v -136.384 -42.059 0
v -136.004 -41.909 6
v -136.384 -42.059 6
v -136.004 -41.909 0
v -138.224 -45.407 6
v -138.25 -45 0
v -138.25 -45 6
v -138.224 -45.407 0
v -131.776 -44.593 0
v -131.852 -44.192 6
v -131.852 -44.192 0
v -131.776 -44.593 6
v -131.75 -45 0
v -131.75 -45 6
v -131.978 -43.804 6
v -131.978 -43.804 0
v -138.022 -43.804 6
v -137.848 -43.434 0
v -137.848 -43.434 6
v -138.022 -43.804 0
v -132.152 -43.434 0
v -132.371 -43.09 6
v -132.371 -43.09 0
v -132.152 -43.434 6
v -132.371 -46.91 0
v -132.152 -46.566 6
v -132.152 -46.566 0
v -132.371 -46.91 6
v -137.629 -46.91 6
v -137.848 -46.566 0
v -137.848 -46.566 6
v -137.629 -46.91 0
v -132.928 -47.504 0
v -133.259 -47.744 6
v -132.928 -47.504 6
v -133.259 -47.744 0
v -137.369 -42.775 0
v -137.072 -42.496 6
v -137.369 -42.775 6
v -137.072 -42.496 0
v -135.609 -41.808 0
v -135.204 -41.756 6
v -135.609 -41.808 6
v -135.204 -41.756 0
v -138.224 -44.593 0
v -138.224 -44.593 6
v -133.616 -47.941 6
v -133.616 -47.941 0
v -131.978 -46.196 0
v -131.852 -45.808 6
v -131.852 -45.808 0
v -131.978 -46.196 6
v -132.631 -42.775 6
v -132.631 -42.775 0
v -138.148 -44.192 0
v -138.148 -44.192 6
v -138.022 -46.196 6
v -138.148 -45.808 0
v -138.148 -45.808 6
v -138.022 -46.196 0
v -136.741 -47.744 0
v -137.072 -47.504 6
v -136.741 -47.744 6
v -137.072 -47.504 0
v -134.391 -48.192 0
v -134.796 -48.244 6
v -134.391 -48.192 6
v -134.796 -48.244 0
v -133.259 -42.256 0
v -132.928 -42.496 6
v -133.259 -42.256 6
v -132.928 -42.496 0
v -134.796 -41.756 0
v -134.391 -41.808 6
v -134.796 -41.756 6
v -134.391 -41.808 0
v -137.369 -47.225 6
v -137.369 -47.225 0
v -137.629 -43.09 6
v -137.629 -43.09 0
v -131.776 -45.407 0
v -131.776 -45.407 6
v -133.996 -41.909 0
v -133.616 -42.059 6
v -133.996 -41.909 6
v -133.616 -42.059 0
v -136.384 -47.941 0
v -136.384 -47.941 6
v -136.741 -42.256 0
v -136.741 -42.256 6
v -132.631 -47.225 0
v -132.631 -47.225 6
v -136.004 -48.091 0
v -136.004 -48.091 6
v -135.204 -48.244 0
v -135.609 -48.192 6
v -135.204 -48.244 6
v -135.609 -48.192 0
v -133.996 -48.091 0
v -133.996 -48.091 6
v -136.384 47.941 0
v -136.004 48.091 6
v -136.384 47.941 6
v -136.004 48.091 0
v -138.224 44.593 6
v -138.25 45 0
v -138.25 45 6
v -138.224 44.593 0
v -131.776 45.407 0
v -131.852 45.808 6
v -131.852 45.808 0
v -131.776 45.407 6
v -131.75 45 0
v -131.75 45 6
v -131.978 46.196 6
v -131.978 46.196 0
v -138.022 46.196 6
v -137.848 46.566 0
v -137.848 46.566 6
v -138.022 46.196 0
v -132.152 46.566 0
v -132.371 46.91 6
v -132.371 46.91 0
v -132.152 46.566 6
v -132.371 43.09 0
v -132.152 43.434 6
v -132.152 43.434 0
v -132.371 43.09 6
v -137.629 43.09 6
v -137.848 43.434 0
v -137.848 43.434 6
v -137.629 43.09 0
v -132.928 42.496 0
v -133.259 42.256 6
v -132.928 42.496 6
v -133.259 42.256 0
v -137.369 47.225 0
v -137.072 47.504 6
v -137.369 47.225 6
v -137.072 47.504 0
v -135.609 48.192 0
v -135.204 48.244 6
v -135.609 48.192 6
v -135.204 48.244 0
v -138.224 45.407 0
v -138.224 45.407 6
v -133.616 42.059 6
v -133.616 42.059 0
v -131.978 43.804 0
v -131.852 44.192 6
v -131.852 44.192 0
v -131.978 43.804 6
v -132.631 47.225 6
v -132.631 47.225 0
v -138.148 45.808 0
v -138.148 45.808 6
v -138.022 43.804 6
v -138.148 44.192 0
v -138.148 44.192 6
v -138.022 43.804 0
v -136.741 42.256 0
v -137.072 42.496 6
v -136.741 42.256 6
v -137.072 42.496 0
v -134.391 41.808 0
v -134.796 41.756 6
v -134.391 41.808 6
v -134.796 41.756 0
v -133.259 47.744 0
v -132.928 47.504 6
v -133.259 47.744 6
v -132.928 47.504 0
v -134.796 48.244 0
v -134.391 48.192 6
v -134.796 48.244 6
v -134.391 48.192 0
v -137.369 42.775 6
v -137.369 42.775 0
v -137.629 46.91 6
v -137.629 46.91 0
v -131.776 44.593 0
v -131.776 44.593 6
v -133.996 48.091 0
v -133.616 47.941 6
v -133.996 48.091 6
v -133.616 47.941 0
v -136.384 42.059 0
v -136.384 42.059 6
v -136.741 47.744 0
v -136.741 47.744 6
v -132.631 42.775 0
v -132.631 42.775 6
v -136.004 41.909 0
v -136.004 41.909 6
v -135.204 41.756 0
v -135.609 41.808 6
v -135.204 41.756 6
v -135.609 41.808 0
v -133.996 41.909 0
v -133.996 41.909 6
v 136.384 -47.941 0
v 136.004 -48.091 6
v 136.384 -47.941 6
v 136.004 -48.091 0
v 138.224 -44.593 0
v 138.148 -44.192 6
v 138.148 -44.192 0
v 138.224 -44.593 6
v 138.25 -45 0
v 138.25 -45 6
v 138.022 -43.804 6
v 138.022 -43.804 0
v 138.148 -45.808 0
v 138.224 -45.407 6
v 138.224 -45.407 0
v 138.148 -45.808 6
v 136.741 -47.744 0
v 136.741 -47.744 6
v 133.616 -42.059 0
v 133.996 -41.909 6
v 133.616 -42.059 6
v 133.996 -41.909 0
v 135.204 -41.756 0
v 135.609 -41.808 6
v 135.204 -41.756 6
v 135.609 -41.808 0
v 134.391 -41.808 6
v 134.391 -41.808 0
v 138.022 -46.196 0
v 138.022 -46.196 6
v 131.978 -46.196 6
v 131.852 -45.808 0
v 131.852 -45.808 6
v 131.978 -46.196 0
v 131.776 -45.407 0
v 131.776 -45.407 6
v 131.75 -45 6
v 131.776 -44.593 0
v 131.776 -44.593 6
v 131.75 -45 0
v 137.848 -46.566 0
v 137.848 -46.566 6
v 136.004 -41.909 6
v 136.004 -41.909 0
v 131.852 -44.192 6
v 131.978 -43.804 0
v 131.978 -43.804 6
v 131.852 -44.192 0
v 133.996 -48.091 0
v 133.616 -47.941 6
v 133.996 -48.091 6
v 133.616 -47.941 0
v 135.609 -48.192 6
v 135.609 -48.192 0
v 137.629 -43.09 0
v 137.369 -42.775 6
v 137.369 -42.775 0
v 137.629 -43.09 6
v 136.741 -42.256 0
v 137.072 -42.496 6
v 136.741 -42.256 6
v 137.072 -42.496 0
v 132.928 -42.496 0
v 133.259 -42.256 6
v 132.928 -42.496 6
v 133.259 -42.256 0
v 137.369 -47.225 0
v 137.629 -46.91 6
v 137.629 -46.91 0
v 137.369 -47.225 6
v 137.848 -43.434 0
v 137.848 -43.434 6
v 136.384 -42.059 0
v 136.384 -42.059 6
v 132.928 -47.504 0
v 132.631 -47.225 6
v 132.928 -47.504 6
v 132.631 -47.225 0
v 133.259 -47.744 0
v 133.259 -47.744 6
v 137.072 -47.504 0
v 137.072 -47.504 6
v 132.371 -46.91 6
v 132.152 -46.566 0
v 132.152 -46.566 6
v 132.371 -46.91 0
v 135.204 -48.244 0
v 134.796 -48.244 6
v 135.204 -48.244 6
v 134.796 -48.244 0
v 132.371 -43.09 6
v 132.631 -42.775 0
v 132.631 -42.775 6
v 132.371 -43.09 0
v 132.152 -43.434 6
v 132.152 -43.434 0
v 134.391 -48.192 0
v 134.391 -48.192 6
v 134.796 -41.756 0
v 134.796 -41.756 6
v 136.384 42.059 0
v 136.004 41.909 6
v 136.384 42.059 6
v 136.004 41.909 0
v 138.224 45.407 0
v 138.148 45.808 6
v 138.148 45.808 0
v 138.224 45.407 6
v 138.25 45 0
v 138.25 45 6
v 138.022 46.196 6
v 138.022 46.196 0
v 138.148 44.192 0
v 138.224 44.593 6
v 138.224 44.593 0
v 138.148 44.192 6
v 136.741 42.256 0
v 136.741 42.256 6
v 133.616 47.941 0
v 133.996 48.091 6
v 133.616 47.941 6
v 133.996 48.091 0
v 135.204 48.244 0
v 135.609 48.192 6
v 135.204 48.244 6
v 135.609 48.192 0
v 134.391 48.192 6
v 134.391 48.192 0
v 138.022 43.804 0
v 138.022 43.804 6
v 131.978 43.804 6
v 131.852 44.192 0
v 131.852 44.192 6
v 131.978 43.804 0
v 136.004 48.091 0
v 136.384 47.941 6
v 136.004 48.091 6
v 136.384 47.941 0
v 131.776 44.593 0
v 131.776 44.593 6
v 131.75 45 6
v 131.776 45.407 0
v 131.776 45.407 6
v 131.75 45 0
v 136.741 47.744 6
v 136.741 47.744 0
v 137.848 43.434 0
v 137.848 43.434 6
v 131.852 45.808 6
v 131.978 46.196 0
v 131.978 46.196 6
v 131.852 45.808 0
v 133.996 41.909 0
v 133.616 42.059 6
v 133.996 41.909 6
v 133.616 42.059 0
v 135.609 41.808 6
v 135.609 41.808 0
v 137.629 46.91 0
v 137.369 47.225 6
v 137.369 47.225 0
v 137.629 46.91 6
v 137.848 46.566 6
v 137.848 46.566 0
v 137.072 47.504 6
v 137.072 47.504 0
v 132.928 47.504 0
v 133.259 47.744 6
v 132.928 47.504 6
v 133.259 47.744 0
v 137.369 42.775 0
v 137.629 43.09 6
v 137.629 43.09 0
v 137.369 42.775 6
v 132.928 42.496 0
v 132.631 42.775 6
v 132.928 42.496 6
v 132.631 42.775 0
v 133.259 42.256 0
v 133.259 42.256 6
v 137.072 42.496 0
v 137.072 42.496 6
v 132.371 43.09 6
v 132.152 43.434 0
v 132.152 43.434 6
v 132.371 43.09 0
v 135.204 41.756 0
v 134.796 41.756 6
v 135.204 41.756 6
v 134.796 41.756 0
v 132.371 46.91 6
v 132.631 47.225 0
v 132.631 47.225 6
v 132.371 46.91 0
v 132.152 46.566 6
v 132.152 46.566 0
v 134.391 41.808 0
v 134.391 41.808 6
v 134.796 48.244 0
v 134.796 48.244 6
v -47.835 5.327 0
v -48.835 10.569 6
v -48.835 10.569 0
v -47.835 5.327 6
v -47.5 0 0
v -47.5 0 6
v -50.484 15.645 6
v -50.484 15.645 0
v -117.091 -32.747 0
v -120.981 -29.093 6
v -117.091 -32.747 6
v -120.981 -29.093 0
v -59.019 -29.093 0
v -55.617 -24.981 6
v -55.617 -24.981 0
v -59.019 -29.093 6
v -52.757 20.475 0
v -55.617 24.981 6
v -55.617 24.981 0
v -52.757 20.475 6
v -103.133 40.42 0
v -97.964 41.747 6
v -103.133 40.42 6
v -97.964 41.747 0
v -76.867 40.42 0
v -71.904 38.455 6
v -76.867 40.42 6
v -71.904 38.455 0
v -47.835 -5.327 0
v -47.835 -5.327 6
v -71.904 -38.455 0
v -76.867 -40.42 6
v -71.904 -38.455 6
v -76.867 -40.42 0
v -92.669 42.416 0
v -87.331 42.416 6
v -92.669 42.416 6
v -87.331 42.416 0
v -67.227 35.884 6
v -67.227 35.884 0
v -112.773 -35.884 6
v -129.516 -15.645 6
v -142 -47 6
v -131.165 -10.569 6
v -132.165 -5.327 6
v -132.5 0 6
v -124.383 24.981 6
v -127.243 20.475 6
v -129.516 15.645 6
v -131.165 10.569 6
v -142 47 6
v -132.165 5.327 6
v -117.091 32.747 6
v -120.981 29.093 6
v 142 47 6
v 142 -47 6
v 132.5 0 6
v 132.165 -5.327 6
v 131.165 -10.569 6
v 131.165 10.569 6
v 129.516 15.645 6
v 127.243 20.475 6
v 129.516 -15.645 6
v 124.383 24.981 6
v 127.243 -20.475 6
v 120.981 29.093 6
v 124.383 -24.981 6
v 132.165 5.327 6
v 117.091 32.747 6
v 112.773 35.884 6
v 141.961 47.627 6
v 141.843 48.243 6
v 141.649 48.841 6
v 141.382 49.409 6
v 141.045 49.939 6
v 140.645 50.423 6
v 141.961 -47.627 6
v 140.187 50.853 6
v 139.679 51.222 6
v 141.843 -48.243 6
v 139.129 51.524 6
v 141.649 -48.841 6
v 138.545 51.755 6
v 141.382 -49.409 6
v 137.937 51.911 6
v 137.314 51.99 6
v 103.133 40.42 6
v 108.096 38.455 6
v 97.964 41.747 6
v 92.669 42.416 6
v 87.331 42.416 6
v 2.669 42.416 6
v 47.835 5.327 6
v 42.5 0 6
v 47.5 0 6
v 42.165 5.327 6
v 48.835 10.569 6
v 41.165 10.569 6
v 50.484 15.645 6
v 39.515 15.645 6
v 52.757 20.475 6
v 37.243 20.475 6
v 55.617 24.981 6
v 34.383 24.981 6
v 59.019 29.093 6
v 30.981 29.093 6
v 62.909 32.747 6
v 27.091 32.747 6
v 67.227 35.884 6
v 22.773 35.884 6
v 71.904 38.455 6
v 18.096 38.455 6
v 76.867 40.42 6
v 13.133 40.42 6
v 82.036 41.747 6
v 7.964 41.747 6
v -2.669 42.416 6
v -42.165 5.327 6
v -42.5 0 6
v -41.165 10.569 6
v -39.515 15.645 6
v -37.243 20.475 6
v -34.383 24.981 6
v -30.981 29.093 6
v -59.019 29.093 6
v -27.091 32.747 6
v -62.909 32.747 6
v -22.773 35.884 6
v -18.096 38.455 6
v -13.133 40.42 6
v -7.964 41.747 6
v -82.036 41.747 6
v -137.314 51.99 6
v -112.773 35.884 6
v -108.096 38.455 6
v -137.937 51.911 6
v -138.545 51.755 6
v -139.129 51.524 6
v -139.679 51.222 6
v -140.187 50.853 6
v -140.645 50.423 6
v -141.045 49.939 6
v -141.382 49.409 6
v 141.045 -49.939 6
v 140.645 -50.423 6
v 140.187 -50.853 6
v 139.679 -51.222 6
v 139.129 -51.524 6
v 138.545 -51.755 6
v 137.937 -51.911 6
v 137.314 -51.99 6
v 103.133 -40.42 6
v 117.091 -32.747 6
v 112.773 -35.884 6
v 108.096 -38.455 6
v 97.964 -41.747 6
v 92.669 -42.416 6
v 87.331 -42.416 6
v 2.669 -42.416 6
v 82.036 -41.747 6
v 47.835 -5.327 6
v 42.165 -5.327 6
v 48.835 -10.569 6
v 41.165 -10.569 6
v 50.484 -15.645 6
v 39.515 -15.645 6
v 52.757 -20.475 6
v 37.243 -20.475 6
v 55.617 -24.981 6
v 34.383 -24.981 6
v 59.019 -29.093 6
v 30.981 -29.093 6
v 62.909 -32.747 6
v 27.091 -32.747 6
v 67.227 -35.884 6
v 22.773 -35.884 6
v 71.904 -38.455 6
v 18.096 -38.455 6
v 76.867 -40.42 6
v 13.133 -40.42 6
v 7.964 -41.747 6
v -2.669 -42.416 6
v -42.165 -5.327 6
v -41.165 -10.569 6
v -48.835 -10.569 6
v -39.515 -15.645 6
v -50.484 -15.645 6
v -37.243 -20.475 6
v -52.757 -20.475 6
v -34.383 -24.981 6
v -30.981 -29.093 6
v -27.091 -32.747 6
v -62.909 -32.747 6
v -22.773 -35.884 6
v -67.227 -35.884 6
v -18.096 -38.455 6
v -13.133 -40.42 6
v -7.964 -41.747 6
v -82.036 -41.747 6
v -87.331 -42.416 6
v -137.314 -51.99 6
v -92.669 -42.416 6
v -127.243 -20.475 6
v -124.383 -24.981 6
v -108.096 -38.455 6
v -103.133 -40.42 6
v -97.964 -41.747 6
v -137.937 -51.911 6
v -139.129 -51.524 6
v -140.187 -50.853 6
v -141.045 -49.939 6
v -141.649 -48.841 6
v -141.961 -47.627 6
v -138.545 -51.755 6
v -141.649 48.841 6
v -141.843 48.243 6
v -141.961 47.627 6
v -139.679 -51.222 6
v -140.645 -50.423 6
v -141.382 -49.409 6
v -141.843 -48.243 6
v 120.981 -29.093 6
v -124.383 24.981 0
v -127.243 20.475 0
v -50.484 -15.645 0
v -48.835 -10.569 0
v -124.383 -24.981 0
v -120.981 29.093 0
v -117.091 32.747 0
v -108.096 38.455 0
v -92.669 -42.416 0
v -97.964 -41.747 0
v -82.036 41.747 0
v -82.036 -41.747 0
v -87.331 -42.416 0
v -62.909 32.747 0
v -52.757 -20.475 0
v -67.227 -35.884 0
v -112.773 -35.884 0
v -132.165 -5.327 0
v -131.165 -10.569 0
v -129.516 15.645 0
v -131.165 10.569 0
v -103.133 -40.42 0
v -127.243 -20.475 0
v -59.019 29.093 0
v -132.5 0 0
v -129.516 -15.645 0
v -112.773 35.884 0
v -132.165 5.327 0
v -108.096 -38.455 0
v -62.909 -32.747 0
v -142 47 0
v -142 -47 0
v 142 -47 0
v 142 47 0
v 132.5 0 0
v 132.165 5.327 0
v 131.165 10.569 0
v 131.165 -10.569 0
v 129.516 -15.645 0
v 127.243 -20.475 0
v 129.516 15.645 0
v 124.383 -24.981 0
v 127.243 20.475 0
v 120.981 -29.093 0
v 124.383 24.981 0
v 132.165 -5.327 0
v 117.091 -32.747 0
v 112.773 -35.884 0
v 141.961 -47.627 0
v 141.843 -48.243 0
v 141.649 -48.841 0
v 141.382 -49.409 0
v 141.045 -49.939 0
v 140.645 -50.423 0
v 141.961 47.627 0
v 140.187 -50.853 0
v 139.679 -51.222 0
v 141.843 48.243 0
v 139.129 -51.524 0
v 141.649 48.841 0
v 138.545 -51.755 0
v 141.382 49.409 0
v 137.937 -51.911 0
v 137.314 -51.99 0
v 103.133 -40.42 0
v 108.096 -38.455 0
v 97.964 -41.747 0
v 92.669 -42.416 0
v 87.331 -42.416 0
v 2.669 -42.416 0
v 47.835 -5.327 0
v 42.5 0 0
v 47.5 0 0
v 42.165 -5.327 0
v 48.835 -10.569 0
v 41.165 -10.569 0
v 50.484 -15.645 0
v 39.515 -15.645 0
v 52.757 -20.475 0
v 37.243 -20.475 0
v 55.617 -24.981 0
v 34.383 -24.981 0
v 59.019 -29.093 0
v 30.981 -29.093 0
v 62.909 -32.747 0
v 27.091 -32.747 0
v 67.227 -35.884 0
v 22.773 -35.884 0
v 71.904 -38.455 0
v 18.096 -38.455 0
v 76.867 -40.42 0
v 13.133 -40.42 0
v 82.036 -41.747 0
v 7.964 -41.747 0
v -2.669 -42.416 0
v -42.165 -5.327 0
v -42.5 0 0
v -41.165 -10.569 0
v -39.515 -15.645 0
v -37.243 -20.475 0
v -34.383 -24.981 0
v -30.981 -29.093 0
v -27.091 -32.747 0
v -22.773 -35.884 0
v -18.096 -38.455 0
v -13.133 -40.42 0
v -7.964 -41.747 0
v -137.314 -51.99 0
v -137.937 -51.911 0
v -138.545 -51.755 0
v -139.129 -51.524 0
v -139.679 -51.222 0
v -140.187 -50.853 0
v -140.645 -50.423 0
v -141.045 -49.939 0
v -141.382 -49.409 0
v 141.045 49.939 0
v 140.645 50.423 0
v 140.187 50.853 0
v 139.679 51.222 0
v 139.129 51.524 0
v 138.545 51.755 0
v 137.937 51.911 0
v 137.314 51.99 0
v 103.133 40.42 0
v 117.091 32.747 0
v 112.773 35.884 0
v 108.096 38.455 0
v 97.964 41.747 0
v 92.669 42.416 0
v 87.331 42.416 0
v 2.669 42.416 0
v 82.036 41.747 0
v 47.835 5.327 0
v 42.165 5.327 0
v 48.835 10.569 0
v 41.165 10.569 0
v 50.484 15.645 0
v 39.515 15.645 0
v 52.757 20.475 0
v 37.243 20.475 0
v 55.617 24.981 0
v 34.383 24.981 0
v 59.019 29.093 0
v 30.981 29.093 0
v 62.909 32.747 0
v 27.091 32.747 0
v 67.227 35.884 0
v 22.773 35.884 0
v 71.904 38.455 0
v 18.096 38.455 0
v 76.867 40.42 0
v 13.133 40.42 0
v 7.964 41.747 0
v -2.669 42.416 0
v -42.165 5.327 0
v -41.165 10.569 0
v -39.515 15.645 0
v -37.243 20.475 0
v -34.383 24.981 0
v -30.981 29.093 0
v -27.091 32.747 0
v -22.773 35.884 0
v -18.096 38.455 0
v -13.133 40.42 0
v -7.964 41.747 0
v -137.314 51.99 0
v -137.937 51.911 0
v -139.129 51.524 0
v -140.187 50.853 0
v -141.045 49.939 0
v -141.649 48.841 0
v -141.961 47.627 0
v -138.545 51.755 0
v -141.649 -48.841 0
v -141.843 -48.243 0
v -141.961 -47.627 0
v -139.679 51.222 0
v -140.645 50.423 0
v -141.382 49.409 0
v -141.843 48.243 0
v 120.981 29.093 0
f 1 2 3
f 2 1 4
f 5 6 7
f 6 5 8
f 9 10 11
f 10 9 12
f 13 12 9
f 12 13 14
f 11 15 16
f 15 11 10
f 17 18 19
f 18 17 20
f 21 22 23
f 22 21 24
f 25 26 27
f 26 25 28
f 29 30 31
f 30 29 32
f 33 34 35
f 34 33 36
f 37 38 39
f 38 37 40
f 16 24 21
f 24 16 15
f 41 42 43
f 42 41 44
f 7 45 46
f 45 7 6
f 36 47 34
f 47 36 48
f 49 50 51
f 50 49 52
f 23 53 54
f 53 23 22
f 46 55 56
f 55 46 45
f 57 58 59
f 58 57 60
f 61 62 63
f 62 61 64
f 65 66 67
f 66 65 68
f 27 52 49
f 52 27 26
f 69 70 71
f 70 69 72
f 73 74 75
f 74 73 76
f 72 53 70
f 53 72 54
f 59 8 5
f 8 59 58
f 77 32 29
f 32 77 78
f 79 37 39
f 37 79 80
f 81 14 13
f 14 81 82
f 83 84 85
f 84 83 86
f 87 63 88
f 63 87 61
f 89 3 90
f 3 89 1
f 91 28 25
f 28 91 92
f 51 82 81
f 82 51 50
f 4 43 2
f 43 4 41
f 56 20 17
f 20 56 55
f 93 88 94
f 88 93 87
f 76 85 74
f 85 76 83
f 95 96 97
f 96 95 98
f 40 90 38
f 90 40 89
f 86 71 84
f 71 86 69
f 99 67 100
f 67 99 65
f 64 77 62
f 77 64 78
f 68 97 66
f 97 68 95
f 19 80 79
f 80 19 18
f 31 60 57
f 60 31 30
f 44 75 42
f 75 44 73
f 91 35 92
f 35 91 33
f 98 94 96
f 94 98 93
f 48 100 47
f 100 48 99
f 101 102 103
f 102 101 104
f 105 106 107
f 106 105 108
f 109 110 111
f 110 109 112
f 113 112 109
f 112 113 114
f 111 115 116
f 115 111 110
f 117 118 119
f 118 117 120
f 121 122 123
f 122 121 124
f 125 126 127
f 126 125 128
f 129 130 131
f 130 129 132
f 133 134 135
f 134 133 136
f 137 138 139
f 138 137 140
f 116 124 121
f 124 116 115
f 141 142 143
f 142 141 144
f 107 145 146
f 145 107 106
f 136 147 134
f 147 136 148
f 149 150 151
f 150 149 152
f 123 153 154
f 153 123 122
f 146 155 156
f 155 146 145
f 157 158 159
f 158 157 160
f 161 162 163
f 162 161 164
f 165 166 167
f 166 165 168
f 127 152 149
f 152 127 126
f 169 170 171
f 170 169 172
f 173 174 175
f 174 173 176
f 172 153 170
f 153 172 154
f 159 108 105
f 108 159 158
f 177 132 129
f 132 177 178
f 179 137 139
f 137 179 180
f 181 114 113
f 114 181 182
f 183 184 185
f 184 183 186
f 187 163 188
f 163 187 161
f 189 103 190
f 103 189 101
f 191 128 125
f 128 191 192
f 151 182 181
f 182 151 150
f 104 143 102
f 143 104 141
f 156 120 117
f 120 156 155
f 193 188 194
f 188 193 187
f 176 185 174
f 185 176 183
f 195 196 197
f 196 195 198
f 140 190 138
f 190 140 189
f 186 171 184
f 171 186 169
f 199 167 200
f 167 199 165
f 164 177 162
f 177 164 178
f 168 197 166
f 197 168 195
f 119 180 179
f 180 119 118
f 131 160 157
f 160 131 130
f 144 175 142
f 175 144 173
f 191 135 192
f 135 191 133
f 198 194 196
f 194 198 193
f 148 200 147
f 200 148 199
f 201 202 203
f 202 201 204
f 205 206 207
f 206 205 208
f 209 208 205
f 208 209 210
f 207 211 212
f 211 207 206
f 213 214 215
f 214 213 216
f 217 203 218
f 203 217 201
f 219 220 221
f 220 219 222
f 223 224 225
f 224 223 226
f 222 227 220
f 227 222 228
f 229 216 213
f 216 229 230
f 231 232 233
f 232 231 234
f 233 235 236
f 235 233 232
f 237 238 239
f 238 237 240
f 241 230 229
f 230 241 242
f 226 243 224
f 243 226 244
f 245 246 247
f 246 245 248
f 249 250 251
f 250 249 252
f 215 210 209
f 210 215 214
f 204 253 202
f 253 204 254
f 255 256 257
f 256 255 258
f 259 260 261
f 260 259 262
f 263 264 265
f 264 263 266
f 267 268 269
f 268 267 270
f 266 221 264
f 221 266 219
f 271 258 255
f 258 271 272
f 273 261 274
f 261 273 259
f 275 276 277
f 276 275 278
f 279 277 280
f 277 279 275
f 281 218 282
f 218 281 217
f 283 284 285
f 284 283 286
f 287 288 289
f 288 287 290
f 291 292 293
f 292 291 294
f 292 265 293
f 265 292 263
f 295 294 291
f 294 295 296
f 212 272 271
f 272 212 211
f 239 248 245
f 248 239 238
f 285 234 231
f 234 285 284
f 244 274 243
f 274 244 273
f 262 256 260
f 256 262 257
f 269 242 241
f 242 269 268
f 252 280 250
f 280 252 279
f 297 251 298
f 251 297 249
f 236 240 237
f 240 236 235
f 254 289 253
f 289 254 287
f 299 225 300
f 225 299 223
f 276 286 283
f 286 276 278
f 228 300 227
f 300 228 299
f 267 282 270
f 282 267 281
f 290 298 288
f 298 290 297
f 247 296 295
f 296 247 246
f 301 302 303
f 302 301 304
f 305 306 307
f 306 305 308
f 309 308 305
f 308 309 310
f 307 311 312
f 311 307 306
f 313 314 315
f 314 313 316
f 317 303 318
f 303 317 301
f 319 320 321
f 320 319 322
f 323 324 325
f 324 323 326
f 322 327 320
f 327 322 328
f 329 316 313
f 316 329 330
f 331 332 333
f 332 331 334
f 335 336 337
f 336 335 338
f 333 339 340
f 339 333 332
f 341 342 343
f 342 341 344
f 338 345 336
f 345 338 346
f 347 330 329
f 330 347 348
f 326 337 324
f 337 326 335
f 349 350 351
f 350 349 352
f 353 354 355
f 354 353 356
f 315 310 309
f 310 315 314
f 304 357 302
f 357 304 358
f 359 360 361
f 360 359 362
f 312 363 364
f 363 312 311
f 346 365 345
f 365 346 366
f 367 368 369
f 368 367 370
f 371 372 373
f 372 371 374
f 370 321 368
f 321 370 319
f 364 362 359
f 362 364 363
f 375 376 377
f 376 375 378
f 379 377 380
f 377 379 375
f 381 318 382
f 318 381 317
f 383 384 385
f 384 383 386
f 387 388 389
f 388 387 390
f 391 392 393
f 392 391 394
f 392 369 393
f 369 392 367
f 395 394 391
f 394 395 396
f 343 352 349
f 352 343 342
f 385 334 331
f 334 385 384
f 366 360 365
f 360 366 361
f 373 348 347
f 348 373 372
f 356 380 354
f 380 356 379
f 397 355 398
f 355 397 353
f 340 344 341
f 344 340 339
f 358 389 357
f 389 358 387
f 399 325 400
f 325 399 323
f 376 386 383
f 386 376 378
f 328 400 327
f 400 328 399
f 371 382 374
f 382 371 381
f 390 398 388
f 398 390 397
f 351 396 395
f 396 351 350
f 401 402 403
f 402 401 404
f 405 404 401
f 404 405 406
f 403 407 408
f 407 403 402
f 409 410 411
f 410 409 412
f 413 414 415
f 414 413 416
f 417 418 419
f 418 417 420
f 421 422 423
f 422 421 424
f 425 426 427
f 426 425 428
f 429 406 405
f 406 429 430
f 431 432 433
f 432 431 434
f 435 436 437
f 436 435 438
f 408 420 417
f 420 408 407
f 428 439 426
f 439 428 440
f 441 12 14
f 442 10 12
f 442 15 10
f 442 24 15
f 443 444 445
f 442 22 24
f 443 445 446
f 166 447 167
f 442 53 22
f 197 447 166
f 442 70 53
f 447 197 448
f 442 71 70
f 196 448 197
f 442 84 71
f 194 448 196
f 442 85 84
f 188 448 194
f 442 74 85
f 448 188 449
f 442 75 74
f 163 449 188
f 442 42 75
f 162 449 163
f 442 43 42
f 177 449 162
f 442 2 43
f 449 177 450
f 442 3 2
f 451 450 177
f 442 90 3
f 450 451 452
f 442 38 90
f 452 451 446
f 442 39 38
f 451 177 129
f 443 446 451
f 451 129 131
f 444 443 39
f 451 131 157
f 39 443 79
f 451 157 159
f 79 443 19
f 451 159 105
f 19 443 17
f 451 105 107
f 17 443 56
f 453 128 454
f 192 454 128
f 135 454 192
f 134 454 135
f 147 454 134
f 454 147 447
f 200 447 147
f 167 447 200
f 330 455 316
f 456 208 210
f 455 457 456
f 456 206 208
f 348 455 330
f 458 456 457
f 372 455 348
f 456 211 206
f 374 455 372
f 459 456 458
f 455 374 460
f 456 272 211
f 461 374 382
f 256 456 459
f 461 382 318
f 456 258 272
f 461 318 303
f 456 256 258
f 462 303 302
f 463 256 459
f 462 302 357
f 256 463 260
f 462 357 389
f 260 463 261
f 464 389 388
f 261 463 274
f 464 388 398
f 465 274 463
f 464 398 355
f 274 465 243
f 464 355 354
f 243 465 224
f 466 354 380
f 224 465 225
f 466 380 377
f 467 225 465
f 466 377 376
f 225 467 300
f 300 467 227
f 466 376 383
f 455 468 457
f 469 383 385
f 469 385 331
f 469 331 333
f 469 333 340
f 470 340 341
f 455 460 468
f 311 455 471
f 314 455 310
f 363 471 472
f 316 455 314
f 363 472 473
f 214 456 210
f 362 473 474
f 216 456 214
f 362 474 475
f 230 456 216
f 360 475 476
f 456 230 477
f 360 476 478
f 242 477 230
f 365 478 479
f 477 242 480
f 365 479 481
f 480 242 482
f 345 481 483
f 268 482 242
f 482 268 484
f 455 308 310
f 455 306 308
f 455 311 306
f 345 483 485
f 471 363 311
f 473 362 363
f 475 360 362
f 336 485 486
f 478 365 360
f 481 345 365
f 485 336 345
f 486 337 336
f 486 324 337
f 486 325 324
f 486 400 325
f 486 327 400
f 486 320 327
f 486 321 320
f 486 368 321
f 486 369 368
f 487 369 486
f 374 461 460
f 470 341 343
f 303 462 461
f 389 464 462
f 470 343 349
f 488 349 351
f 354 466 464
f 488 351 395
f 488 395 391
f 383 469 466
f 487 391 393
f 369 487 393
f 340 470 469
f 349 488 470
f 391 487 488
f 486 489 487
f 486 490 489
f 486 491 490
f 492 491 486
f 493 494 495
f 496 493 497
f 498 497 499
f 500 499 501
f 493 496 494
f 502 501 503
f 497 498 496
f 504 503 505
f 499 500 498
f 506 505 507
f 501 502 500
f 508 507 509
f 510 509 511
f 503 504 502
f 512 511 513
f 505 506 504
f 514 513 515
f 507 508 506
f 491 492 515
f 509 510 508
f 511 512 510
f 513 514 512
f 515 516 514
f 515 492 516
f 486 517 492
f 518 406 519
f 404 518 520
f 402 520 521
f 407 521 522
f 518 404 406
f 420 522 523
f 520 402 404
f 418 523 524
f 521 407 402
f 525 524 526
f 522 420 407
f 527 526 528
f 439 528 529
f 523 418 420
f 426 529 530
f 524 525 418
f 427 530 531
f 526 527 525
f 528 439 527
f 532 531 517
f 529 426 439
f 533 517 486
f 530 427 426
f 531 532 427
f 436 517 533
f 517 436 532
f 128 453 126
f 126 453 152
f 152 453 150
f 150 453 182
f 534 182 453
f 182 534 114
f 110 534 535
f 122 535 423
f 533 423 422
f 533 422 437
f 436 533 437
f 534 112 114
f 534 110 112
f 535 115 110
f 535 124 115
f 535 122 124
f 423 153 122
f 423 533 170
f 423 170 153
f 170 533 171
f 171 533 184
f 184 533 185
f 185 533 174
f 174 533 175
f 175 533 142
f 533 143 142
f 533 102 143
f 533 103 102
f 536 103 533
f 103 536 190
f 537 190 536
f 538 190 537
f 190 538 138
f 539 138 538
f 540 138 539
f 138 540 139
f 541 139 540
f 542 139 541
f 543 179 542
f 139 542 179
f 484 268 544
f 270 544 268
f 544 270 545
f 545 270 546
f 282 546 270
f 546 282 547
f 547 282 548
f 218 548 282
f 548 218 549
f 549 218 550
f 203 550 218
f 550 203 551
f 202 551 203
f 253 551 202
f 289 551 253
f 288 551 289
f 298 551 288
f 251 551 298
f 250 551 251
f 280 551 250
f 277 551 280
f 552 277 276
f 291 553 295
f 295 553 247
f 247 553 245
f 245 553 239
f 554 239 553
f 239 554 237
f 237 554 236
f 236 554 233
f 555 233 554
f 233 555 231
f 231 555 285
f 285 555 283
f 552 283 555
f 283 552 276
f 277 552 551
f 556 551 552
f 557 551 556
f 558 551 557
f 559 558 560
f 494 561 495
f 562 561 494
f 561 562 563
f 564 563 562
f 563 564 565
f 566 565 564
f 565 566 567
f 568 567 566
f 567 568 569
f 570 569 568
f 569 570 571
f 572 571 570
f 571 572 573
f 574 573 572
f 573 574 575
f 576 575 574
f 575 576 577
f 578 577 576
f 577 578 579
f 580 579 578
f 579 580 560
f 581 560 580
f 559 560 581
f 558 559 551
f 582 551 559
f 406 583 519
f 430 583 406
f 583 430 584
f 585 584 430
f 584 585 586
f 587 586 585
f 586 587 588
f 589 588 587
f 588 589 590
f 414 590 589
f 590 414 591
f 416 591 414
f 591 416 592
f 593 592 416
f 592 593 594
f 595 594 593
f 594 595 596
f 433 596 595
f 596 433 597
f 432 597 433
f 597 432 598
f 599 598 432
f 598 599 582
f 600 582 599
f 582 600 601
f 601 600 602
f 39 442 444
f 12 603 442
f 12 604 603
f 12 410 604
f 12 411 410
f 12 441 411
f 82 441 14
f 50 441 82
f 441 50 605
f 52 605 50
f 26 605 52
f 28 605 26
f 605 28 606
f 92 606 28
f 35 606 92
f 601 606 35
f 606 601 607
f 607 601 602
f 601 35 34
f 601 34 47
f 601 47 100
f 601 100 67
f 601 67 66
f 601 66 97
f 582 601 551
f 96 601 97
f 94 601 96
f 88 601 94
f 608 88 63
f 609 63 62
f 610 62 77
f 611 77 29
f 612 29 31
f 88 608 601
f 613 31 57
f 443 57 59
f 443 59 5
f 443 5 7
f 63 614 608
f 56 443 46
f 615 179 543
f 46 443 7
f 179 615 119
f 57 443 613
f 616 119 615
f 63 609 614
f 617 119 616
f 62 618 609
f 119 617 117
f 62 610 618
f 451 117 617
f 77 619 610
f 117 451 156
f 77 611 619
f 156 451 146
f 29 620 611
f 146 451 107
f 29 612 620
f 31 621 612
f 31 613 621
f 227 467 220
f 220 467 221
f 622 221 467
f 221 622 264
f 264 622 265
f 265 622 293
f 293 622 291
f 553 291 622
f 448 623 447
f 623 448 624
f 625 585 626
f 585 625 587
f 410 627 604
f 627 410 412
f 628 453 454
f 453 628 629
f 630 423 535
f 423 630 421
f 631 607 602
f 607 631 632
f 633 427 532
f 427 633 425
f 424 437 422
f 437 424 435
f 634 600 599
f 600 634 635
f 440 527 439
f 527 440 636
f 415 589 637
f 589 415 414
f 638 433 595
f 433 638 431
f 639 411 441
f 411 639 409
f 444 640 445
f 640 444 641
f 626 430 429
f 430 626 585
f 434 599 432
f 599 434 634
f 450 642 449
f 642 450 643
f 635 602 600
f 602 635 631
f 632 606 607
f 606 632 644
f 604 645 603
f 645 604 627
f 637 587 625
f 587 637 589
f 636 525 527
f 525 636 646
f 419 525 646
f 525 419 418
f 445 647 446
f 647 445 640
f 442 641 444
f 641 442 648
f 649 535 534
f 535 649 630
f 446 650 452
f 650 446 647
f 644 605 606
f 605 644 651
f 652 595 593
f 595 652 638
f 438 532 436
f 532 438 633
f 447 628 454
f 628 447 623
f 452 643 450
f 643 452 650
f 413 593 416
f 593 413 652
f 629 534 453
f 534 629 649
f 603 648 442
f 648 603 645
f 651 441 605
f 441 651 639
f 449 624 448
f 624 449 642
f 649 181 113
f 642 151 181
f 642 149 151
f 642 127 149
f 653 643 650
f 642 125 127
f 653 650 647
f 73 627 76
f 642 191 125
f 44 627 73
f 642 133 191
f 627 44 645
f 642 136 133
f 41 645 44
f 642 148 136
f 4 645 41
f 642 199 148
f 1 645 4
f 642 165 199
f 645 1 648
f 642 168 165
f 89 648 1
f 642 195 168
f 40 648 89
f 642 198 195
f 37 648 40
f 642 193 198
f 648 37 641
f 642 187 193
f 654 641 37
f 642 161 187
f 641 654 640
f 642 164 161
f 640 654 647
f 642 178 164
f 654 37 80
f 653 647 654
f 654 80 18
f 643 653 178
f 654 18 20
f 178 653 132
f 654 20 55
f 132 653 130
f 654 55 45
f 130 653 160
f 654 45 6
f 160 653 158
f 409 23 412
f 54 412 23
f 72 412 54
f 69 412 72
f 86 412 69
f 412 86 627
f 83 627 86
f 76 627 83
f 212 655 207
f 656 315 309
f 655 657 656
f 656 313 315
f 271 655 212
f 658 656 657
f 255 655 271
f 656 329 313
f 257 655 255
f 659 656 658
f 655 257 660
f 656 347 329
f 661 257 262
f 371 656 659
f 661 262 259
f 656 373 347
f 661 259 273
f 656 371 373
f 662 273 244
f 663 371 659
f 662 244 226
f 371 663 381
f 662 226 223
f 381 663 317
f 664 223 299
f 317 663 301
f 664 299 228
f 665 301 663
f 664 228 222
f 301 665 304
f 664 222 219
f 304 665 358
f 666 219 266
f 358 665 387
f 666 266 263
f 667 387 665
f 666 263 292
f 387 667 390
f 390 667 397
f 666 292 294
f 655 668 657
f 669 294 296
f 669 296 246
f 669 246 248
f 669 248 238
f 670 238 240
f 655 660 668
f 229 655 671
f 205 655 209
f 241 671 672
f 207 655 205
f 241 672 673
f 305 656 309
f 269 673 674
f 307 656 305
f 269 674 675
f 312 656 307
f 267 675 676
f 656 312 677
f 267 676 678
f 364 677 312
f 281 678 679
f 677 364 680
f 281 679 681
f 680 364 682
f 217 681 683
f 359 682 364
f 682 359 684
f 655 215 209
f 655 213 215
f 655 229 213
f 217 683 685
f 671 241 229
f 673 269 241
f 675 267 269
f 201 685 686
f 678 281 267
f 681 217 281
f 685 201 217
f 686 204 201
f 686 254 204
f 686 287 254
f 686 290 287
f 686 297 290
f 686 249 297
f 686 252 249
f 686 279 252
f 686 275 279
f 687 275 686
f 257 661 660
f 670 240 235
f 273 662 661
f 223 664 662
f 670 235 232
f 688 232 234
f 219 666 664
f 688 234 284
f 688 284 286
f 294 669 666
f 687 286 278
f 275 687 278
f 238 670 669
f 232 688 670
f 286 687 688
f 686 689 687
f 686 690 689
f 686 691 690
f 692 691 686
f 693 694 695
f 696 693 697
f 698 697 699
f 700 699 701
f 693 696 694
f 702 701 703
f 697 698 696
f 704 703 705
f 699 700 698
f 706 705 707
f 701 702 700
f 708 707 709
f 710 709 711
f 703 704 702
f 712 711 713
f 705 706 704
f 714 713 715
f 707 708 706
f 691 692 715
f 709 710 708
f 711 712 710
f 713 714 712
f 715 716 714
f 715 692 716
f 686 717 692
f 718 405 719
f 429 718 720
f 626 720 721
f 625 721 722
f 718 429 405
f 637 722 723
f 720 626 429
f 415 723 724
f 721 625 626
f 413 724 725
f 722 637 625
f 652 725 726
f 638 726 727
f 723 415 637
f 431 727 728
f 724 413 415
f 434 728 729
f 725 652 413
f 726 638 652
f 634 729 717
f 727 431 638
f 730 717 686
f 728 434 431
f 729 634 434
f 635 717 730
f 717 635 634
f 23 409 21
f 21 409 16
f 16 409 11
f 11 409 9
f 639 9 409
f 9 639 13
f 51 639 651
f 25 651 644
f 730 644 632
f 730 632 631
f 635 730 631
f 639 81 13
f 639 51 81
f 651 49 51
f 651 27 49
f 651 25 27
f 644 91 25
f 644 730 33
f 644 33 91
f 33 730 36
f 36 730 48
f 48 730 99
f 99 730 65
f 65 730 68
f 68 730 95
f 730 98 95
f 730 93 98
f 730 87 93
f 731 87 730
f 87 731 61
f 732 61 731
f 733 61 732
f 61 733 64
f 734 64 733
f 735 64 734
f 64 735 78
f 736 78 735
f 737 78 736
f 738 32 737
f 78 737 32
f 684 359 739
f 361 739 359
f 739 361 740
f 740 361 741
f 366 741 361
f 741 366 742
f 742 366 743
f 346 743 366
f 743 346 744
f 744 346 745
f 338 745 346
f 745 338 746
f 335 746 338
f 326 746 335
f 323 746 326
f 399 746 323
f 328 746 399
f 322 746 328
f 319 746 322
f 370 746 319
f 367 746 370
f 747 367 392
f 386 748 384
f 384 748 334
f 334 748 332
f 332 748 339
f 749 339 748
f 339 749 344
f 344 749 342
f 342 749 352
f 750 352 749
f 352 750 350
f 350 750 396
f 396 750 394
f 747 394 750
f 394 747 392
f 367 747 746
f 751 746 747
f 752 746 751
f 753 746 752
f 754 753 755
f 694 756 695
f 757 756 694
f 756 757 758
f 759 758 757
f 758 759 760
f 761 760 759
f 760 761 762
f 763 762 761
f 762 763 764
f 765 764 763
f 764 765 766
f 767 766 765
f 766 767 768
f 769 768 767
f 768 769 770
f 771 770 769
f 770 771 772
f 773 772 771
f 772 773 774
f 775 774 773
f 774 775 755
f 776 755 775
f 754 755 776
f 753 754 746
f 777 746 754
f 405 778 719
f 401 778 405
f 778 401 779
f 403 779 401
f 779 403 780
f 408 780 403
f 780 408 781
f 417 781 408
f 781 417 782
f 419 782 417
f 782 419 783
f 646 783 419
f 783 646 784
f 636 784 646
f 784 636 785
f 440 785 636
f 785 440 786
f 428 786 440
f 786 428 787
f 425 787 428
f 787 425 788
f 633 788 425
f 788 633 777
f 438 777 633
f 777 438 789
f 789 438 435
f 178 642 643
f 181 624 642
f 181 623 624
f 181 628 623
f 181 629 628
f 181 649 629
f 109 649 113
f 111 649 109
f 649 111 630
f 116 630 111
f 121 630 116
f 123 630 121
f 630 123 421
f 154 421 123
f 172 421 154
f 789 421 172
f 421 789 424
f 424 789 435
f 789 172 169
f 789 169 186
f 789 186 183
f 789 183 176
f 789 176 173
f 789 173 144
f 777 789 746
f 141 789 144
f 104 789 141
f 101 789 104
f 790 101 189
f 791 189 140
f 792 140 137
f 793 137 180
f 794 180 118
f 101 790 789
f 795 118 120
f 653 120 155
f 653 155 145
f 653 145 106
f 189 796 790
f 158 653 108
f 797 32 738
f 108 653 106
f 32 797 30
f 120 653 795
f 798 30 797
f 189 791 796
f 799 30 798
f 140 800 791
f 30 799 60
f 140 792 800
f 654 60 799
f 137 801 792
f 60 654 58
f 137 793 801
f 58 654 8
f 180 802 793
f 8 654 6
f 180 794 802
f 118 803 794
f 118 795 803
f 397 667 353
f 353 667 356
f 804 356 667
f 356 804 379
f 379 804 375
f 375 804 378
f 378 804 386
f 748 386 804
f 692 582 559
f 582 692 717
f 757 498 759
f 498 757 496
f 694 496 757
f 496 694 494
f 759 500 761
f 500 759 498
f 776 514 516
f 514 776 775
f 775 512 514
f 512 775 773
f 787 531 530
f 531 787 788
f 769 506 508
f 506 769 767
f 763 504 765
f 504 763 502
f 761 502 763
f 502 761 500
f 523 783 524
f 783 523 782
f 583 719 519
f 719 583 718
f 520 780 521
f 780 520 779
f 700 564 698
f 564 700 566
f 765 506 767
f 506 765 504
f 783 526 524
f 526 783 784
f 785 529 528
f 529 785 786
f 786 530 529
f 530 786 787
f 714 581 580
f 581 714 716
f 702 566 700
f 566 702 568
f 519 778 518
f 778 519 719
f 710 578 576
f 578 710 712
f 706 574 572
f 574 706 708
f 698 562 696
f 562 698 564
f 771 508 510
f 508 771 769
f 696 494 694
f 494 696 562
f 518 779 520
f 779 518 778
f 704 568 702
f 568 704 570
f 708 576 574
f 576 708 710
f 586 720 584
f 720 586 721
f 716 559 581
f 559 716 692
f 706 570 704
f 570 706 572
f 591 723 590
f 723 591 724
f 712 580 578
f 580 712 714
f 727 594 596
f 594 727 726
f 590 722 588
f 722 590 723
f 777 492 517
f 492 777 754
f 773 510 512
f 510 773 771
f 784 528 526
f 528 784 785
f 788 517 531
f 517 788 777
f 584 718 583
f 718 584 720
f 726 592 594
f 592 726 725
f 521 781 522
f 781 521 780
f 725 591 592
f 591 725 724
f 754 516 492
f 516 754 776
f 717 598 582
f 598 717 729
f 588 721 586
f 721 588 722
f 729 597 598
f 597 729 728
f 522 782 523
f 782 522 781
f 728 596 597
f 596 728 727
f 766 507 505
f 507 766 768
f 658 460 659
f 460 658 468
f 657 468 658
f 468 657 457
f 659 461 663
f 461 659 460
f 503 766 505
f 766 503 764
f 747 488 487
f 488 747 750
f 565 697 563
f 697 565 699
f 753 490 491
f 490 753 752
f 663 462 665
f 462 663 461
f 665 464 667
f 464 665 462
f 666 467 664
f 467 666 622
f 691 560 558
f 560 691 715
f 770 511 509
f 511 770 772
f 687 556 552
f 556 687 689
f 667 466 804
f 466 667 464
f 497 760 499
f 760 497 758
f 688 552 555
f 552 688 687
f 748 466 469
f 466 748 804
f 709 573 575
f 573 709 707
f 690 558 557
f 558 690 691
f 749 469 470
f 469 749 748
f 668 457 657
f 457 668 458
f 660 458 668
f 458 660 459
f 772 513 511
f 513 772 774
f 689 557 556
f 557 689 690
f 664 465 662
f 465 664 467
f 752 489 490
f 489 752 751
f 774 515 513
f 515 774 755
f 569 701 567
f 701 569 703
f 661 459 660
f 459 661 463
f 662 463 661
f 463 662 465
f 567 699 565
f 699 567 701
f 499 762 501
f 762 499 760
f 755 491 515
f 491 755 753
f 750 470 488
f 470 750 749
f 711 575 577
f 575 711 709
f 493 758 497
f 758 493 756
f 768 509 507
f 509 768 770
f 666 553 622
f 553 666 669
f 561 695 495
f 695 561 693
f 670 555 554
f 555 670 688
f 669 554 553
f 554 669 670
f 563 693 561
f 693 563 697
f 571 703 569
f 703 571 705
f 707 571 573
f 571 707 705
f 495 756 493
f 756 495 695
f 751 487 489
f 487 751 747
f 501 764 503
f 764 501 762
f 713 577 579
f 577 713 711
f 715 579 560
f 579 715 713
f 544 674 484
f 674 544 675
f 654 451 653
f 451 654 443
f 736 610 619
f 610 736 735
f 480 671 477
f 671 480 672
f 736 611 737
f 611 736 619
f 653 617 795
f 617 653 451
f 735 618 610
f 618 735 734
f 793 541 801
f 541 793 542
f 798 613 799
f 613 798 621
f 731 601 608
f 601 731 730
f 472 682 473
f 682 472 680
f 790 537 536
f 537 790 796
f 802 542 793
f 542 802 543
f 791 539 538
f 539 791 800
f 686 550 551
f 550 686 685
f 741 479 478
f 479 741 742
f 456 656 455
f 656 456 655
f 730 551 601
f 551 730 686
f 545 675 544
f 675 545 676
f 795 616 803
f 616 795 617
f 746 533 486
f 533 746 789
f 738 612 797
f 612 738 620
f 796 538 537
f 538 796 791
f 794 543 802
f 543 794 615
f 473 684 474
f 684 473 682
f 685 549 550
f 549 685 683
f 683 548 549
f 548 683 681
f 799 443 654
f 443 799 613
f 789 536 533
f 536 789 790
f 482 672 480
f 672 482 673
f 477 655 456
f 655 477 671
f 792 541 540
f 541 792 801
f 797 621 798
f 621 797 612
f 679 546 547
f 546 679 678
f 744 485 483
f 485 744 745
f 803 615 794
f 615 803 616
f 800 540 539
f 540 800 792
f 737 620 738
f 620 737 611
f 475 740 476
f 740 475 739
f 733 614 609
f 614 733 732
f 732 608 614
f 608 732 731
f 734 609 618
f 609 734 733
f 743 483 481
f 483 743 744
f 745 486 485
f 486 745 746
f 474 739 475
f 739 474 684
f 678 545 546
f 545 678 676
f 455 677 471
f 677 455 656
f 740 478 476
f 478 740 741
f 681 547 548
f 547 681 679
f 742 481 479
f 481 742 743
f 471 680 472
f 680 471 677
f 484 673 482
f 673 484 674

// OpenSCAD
$fn = 50;


difference() {
	union() {
		hull() {
			translate(v = [-137.0000000000, 47.0000000000, 0]) {
				cylinder(h = 6, r = 5);
			}
			translate(v = [137.0000000000, 47.0000000000, 0]) {
				cylinder(h = 6, r = 5);
			}
			translate(v = [-137.0000000000, -47.0000000000, 0]) {
				cylinder(h = 6, r = 5);
			}
			translate(v = [137.0000000000, -47.0000000000, 0]) {
				cylinder(h = 6, r = 5);
			}
		}
	}
	union() {
		#translate(v = [-135.0000000000, -45.0000000000, -100.0000000000]) {
			cylinder(h = 200, r = 3.2500000000);
		}
		#translate(v = [-135.0000000000, 45.0000000000, -100.0000000000]) {
			cylinder(h = 200, r = 3.2500000000);
		}
		#translate(v = [135.0000000000, -45.0000000000, -100.0000000000]) {
			cylinder(h = 200, r = 3.2500000000);
		}
		#translate(v = [135.0000000000, 45.0000000000, -100.0000000000]) {
			cylinder(h = 200, r = 3.2500000000);
		}
		#translate(v = [-90.0000000000, 0, 0]) {
			cylinder(h = 6, r = 42.5000000000);
		}
		#cylinder(h = 6, r = 42.5000000000);
		#translate(v = [90.0000000000, 0, 0]) {
			cylinder(h = 6, r = 42.5000000000);
		}
	}
}
